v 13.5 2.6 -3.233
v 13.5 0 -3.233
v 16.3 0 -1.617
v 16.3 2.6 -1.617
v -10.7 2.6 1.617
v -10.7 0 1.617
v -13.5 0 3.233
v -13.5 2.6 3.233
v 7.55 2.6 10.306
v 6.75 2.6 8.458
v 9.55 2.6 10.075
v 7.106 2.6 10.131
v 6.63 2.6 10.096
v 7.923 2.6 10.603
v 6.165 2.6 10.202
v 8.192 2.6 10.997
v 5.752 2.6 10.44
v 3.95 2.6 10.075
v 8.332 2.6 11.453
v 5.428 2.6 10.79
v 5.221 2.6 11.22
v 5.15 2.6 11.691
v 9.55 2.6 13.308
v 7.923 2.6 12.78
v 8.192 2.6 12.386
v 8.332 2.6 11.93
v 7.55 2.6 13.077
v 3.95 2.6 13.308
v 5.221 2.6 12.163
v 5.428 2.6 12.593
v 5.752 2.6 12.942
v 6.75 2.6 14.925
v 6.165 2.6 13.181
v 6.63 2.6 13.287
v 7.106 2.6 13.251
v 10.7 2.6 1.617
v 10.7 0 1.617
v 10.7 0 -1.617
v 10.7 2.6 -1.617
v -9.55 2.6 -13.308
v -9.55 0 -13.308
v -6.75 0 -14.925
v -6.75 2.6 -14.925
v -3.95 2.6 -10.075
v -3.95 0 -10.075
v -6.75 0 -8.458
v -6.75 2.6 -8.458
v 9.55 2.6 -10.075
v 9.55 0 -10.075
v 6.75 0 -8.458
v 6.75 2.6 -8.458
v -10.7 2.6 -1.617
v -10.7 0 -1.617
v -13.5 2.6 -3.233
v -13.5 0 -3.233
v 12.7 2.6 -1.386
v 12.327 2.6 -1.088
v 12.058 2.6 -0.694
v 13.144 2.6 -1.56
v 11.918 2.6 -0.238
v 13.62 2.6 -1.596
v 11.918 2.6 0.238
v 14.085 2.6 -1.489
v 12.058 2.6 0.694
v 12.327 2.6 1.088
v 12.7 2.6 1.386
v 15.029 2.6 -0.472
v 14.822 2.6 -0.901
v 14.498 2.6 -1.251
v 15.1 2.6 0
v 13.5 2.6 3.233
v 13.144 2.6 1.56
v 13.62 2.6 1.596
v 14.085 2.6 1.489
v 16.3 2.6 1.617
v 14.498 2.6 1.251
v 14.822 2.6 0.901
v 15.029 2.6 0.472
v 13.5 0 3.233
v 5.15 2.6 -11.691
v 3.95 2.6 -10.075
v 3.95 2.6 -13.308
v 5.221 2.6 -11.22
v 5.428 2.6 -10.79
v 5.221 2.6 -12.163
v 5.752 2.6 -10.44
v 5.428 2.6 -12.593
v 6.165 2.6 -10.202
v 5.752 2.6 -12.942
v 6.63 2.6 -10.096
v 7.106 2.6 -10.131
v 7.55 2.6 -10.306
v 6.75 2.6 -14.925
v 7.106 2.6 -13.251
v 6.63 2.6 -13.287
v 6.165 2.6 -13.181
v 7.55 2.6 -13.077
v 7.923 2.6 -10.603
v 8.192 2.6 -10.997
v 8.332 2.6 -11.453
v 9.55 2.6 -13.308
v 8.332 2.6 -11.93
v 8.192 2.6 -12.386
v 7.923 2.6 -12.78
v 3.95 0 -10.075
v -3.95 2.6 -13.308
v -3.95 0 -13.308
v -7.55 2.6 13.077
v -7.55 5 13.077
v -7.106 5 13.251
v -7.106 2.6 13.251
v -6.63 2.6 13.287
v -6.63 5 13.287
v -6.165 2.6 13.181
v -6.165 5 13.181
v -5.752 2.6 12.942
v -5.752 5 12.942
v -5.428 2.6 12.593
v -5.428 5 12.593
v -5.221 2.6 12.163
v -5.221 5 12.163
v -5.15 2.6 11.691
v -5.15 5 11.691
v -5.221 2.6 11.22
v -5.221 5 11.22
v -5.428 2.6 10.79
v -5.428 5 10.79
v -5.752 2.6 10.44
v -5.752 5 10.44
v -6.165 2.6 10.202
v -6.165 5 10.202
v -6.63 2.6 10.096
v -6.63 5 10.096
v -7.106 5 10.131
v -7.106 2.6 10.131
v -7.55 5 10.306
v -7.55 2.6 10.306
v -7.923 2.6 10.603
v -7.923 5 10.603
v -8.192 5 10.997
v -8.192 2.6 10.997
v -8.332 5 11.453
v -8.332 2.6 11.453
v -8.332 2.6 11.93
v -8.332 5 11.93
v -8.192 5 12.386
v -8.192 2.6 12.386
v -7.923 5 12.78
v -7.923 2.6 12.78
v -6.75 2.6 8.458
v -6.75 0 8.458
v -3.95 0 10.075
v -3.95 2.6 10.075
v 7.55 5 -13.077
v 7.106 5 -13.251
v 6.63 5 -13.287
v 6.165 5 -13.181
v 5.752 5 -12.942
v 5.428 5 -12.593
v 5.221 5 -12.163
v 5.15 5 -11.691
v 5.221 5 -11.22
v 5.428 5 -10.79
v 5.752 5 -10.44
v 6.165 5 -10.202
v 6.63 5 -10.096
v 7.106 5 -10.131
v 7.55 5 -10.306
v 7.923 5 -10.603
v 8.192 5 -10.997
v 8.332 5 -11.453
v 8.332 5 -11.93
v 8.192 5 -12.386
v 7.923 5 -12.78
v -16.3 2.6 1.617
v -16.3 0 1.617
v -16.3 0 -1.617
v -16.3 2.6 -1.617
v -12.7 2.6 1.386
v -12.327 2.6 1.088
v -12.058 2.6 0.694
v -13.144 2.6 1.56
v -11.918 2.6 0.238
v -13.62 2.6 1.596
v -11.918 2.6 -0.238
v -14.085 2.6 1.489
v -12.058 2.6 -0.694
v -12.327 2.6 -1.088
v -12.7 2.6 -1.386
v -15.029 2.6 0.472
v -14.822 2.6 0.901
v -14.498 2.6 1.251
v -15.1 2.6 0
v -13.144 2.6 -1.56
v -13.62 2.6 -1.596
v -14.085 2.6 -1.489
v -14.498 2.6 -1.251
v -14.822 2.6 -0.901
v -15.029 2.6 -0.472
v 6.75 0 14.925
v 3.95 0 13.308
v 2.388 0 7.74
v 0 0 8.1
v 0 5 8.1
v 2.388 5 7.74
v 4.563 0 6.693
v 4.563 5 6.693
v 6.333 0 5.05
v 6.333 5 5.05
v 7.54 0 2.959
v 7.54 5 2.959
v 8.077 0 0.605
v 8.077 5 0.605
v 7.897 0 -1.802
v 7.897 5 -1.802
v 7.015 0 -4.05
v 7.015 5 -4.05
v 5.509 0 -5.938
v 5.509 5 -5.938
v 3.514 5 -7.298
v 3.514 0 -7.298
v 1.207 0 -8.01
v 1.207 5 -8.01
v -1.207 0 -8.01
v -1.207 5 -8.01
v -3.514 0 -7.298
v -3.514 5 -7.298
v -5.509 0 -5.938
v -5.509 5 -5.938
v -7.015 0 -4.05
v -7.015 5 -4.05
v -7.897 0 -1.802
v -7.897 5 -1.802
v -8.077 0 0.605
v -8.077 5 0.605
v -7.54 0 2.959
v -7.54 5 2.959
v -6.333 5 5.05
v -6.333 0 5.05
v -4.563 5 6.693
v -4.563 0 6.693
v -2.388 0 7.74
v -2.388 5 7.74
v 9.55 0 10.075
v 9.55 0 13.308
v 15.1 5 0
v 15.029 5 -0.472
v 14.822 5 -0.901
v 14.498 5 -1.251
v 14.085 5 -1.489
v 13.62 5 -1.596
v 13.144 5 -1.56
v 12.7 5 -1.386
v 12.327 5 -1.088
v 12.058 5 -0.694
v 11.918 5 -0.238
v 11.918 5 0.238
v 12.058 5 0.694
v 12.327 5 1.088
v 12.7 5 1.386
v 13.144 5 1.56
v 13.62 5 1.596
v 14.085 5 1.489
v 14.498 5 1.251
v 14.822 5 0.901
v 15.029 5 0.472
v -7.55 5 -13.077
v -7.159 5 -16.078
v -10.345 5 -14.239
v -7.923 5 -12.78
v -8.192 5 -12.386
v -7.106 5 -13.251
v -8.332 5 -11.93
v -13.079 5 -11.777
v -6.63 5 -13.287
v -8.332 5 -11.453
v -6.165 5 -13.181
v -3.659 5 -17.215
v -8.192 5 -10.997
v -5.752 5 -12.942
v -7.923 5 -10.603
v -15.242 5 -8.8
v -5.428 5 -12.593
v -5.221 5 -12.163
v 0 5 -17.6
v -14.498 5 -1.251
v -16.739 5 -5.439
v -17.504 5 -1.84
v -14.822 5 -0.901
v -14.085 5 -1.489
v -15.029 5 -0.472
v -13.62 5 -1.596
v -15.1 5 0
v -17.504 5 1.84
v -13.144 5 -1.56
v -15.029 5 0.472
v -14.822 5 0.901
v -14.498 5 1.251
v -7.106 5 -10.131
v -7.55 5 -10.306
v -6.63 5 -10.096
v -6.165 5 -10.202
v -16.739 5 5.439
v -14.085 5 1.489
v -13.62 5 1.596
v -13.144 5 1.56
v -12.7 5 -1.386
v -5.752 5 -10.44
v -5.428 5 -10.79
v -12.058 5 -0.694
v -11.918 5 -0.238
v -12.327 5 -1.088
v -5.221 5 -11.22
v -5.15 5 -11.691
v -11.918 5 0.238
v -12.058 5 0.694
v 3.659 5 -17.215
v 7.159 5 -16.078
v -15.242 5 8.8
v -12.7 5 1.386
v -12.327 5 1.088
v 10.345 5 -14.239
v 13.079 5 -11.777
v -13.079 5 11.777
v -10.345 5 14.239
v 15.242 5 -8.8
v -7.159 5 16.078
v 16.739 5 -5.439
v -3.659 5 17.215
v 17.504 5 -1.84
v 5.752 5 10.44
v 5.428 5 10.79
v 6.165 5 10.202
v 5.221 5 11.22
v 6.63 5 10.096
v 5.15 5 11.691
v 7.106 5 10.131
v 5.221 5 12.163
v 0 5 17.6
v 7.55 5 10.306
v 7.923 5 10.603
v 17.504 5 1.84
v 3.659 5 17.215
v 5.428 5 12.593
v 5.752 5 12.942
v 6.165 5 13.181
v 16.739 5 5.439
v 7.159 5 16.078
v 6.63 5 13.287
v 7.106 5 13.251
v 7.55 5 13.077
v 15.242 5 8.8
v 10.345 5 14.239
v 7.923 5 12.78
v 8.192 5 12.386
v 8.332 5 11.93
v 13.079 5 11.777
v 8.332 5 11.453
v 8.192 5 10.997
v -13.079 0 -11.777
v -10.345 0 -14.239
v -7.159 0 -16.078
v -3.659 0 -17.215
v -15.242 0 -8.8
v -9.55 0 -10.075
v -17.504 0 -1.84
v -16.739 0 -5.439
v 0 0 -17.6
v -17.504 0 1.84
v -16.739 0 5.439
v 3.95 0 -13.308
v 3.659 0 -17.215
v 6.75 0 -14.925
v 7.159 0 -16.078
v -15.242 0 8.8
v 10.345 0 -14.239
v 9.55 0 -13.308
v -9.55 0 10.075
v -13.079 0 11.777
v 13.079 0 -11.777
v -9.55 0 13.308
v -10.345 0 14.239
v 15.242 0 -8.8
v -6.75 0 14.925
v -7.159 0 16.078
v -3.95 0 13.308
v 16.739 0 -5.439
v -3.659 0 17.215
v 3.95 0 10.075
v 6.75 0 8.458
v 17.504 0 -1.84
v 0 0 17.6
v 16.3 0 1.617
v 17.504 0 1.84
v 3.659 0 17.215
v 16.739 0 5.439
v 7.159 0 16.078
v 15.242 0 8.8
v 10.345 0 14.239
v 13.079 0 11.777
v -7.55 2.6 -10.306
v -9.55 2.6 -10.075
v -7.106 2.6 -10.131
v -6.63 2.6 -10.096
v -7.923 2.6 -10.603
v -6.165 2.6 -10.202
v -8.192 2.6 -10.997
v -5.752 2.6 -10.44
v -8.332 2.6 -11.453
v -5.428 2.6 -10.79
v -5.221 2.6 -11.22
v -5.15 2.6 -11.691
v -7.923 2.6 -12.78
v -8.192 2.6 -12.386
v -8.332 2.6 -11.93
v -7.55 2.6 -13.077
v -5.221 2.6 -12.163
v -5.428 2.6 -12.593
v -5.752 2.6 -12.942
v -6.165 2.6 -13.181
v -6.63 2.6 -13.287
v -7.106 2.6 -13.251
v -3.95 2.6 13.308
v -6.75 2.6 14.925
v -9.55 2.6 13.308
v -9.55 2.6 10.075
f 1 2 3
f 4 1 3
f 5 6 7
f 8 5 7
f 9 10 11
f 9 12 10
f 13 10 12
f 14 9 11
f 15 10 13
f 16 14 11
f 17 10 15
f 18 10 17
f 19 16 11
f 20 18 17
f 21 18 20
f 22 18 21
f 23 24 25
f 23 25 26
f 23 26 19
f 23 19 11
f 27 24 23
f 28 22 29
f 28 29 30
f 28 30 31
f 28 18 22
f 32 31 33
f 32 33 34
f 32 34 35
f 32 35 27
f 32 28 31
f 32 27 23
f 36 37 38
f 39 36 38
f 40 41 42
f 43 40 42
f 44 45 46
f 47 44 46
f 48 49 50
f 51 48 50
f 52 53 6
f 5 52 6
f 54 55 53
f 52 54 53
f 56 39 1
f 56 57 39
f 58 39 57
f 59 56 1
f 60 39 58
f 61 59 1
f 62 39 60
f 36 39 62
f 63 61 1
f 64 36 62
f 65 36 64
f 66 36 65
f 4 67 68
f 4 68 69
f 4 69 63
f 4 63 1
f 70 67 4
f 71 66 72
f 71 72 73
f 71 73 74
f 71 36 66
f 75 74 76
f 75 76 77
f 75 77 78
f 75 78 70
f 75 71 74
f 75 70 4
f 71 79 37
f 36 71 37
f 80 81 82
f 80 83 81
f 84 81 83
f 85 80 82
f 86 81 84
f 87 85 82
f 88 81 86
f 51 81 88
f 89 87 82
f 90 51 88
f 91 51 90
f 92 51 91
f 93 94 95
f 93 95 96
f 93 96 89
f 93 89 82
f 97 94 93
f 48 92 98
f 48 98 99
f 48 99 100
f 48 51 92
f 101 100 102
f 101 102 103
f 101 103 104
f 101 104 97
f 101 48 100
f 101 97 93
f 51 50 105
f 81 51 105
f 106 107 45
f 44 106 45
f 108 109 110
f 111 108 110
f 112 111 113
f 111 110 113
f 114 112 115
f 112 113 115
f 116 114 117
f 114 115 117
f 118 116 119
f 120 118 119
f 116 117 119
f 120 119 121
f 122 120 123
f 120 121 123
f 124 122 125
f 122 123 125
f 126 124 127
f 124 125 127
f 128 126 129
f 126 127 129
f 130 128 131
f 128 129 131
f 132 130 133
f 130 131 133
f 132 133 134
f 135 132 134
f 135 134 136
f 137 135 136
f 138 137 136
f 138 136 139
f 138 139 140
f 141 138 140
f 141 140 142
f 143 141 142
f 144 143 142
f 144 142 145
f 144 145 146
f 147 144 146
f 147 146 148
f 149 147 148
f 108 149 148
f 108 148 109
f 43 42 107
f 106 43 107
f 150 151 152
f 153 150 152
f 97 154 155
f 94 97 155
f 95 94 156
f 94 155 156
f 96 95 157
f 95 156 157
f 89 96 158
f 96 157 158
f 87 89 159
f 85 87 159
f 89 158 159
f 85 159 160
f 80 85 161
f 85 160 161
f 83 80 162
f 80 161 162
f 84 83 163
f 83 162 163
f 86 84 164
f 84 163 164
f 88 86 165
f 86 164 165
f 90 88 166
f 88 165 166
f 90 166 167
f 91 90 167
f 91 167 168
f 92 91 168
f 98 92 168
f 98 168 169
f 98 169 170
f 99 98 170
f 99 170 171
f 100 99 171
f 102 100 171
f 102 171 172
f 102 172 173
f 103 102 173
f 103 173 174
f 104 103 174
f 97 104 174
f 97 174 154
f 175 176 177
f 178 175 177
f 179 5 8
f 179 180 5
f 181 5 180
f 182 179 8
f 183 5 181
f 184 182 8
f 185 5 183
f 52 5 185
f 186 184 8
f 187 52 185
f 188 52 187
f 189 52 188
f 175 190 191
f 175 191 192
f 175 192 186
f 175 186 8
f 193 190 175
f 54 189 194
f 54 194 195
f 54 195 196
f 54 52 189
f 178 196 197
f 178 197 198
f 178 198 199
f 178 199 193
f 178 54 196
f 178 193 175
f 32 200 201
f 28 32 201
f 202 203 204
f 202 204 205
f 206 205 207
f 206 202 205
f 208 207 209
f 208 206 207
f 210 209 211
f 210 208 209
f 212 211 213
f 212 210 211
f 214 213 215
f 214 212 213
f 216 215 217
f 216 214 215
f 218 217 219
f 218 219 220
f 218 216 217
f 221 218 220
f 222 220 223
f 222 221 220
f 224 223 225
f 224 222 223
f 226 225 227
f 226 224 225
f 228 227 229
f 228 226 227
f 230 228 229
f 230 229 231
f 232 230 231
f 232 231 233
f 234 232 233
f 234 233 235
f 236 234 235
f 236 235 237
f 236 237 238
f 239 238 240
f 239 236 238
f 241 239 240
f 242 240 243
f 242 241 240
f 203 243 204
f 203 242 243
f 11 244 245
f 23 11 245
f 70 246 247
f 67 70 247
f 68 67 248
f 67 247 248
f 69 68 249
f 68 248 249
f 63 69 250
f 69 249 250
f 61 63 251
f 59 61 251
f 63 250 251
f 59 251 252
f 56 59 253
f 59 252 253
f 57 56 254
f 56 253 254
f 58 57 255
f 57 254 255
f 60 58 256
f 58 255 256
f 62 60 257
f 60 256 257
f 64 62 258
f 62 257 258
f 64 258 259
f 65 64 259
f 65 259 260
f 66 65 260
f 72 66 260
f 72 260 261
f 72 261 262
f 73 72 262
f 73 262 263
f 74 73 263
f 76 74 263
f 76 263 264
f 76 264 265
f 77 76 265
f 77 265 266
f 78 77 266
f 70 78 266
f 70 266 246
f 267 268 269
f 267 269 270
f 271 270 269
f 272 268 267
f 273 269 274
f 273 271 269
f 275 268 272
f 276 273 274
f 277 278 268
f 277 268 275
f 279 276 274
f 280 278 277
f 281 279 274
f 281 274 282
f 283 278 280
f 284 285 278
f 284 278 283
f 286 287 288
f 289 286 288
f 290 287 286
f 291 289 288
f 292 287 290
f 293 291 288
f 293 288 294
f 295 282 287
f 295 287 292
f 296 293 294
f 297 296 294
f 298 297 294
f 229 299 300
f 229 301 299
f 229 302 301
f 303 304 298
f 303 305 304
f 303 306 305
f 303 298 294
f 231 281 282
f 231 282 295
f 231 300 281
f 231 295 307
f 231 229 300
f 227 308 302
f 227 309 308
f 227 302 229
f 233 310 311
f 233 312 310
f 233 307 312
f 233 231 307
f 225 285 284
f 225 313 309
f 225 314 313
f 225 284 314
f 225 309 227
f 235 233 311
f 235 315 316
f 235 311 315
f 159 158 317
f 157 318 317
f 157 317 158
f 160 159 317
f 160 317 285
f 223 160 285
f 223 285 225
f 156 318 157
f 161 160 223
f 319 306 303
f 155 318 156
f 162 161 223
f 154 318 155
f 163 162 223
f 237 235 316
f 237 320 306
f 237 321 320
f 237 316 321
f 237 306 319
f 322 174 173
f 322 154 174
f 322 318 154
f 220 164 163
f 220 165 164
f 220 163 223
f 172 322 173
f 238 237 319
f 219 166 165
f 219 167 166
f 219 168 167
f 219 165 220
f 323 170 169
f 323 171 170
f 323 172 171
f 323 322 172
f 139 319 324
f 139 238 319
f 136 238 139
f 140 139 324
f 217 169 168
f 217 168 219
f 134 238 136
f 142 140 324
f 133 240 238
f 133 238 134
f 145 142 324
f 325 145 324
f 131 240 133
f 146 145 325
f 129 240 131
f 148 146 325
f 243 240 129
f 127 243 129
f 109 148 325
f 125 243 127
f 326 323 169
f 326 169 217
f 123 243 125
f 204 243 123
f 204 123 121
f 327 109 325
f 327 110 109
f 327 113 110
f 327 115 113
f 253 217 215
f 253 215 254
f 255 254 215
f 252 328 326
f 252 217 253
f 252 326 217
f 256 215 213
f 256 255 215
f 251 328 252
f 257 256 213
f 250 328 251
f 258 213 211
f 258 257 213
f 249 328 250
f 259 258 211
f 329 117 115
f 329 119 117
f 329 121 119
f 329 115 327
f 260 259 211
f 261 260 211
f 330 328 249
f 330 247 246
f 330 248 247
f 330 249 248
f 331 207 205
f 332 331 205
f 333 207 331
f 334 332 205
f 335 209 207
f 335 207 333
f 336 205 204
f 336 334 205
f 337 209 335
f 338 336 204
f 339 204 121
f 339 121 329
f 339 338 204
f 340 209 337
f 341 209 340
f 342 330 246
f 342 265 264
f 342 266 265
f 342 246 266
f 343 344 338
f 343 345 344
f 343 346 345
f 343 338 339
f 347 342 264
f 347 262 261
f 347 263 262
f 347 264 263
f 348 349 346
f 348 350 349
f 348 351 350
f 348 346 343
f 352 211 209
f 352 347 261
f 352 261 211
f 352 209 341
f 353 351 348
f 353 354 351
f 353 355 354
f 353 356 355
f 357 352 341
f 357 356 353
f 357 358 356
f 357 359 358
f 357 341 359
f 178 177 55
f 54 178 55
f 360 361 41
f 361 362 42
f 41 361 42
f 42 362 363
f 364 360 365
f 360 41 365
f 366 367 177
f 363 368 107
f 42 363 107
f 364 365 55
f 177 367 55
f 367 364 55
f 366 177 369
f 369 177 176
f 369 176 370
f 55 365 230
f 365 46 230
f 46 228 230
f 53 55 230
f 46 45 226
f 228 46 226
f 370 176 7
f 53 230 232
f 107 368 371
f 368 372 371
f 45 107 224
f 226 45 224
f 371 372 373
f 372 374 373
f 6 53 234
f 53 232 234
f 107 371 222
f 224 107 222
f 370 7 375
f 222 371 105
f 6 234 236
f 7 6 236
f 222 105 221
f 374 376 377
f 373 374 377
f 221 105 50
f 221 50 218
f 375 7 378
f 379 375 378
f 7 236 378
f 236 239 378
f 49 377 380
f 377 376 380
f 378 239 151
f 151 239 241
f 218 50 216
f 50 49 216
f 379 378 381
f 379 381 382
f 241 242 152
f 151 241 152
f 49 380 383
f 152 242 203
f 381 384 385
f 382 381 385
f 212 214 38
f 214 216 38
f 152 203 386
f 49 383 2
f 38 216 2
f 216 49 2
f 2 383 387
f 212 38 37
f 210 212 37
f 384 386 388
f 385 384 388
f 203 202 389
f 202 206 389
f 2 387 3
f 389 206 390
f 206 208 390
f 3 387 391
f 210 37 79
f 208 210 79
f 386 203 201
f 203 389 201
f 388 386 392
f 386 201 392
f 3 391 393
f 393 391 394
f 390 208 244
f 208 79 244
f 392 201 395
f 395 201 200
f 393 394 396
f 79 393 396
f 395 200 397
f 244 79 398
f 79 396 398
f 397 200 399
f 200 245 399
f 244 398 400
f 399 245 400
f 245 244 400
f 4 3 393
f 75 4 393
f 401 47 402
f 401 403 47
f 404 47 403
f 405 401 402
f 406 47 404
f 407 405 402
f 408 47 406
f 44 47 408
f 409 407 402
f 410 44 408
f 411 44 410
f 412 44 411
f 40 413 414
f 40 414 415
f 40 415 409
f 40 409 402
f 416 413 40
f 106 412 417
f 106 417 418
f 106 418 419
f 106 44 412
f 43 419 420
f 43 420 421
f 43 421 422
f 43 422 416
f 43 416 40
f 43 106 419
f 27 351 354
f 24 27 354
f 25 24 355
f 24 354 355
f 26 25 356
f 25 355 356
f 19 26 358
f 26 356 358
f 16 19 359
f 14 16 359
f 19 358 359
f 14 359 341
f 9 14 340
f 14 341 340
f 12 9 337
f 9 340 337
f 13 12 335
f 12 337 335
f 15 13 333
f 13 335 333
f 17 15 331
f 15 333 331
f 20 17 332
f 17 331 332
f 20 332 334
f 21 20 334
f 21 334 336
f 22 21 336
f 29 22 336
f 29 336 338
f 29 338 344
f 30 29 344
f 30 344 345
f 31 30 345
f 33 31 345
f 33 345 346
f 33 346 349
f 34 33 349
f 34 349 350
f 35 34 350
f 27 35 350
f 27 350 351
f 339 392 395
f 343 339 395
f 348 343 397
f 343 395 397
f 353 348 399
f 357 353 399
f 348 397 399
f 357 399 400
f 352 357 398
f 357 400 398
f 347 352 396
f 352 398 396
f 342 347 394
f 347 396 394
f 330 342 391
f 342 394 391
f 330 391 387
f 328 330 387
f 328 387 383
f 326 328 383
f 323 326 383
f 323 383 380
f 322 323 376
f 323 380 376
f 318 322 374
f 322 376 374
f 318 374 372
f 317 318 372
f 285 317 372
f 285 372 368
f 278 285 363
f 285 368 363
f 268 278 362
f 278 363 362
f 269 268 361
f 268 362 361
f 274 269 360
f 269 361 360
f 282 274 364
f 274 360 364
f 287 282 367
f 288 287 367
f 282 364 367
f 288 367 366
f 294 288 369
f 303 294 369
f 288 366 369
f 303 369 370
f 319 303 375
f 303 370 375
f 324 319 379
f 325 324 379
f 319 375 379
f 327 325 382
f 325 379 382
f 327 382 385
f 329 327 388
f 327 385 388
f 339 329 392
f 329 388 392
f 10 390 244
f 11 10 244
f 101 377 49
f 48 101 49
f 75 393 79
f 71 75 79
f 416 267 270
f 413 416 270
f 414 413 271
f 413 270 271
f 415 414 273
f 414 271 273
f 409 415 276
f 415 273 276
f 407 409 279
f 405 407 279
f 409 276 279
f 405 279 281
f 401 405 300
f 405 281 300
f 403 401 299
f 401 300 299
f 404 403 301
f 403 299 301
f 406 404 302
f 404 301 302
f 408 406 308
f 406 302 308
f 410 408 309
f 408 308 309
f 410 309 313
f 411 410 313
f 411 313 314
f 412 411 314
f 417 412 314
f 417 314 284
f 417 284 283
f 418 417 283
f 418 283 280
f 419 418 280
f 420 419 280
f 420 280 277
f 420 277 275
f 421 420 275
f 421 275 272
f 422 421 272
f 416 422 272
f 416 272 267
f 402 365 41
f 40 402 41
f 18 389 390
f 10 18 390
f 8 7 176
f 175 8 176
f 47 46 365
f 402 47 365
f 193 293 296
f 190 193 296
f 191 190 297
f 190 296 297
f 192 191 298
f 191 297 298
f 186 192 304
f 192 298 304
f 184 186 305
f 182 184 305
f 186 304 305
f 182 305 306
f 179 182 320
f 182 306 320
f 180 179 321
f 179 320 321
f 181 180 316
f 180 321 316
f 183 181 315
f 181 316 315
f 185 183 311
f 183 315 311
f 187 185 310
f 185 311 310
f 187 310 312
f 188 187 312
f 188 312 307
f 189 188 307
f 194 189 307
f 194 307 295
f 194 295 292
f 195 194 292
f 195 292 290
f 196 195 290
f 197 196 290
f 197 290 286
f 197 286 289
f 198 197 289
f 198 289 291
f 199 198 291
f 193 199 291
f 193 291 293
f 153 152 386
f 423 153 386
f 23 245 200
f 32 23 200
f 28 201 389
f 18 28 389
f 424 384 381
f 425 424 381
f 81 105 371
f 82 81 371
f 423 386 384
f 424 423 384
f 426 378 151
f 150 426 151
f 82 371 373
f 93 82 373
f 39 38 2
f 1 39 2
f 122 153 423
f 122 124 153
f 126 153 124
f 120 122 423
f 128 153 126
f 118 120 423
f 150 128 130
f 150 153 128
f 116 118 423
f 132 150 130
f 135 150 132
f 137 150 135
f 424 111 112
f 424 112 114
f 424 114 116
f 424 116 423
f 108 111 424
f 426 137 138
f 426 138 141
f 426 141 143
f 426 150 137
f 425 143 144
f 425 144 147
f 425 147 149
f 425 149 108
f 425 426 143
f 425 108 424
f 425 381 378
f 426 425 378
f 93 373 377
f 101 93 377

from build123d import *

# Parameters (mm, degrees)
SKETCH1_R            = 17.6
SKETCH1_R_2          = 8.1
BOSS_EXTRUDE1_DEPTH  = 5
CUT_EXTRUDE1_DEPTH   = 2.6
M3_CLEARANCE_HOLE1_D = 3.2
CIRPATTERN1_COUNT    = 6


with BuildPart() as part:
    # Sketch1 → Boss-Extrude1 (new body)
    with BuildSketch(Plane(origin=(0, 0, 0), x_dir=(1, 0, 0), z_dir=(0, 1, 0))):
        with Locations(Location((0, 0, 0), (0, 0, 270))):
            Circle(SKETCH1_R)
        with Locations(Location((0, 0, 0), (0, 0, 270))):
            Circle(SKETCH1_R_2, mode=Mode.SUBTRACT)
    extrude(amount=BOSS_EXTRUDE1_DEPTH)

    # Sketch2 → Cut-Extrude1 (cut)
    with BuildSketch(Plane.XZ):
        Polygon((13.5, 3.233161507), (10.7, 1.616580754), (10.7, -1.616580754), (13.5, -3.233161507), (16.3, -1.616580754), (16.3, 1.616580754), align=None)
    cut_extrude1 = extrude(amount=-CUT_EXTRUDE1_DEPTH, mode=Mode.SUBTRACT)

    # M3 Clearance Hole1 (through all)
    with Locations(Plane(origin=(0, 2.6, 0), x_dir=(-1, 0, 0), z_dir=(0, -1, 0))):
        with Locations((-13.5, 0)):
            m3_clearance_hole1 = Hole(M3_CLEARANCE_HOLE1_D / 2)

    # CirPattern1: Cut-Extrude1, M3 Clearance Hole1 ×6 about axis
    cirpattern1_axis = Axis((0, 0, 0), (0, 1, 0))
    add([cut_extrude1.rotate(cirpattern1_axis, i * 360 / CIRPATTERN1_COUNT) for i in range(1, CIRPATTERN1_COUNT)], mode=Mode.SUBTRACT)
    add([m3_clearance_hole1.rotate(cirpattern1_axis, i * 360 / CIRPATTERN1_COUNT) for i in range(1, CIRPATTERN1_COUNT)], mode=Mode.SUBTRACT)


solid = part.part
